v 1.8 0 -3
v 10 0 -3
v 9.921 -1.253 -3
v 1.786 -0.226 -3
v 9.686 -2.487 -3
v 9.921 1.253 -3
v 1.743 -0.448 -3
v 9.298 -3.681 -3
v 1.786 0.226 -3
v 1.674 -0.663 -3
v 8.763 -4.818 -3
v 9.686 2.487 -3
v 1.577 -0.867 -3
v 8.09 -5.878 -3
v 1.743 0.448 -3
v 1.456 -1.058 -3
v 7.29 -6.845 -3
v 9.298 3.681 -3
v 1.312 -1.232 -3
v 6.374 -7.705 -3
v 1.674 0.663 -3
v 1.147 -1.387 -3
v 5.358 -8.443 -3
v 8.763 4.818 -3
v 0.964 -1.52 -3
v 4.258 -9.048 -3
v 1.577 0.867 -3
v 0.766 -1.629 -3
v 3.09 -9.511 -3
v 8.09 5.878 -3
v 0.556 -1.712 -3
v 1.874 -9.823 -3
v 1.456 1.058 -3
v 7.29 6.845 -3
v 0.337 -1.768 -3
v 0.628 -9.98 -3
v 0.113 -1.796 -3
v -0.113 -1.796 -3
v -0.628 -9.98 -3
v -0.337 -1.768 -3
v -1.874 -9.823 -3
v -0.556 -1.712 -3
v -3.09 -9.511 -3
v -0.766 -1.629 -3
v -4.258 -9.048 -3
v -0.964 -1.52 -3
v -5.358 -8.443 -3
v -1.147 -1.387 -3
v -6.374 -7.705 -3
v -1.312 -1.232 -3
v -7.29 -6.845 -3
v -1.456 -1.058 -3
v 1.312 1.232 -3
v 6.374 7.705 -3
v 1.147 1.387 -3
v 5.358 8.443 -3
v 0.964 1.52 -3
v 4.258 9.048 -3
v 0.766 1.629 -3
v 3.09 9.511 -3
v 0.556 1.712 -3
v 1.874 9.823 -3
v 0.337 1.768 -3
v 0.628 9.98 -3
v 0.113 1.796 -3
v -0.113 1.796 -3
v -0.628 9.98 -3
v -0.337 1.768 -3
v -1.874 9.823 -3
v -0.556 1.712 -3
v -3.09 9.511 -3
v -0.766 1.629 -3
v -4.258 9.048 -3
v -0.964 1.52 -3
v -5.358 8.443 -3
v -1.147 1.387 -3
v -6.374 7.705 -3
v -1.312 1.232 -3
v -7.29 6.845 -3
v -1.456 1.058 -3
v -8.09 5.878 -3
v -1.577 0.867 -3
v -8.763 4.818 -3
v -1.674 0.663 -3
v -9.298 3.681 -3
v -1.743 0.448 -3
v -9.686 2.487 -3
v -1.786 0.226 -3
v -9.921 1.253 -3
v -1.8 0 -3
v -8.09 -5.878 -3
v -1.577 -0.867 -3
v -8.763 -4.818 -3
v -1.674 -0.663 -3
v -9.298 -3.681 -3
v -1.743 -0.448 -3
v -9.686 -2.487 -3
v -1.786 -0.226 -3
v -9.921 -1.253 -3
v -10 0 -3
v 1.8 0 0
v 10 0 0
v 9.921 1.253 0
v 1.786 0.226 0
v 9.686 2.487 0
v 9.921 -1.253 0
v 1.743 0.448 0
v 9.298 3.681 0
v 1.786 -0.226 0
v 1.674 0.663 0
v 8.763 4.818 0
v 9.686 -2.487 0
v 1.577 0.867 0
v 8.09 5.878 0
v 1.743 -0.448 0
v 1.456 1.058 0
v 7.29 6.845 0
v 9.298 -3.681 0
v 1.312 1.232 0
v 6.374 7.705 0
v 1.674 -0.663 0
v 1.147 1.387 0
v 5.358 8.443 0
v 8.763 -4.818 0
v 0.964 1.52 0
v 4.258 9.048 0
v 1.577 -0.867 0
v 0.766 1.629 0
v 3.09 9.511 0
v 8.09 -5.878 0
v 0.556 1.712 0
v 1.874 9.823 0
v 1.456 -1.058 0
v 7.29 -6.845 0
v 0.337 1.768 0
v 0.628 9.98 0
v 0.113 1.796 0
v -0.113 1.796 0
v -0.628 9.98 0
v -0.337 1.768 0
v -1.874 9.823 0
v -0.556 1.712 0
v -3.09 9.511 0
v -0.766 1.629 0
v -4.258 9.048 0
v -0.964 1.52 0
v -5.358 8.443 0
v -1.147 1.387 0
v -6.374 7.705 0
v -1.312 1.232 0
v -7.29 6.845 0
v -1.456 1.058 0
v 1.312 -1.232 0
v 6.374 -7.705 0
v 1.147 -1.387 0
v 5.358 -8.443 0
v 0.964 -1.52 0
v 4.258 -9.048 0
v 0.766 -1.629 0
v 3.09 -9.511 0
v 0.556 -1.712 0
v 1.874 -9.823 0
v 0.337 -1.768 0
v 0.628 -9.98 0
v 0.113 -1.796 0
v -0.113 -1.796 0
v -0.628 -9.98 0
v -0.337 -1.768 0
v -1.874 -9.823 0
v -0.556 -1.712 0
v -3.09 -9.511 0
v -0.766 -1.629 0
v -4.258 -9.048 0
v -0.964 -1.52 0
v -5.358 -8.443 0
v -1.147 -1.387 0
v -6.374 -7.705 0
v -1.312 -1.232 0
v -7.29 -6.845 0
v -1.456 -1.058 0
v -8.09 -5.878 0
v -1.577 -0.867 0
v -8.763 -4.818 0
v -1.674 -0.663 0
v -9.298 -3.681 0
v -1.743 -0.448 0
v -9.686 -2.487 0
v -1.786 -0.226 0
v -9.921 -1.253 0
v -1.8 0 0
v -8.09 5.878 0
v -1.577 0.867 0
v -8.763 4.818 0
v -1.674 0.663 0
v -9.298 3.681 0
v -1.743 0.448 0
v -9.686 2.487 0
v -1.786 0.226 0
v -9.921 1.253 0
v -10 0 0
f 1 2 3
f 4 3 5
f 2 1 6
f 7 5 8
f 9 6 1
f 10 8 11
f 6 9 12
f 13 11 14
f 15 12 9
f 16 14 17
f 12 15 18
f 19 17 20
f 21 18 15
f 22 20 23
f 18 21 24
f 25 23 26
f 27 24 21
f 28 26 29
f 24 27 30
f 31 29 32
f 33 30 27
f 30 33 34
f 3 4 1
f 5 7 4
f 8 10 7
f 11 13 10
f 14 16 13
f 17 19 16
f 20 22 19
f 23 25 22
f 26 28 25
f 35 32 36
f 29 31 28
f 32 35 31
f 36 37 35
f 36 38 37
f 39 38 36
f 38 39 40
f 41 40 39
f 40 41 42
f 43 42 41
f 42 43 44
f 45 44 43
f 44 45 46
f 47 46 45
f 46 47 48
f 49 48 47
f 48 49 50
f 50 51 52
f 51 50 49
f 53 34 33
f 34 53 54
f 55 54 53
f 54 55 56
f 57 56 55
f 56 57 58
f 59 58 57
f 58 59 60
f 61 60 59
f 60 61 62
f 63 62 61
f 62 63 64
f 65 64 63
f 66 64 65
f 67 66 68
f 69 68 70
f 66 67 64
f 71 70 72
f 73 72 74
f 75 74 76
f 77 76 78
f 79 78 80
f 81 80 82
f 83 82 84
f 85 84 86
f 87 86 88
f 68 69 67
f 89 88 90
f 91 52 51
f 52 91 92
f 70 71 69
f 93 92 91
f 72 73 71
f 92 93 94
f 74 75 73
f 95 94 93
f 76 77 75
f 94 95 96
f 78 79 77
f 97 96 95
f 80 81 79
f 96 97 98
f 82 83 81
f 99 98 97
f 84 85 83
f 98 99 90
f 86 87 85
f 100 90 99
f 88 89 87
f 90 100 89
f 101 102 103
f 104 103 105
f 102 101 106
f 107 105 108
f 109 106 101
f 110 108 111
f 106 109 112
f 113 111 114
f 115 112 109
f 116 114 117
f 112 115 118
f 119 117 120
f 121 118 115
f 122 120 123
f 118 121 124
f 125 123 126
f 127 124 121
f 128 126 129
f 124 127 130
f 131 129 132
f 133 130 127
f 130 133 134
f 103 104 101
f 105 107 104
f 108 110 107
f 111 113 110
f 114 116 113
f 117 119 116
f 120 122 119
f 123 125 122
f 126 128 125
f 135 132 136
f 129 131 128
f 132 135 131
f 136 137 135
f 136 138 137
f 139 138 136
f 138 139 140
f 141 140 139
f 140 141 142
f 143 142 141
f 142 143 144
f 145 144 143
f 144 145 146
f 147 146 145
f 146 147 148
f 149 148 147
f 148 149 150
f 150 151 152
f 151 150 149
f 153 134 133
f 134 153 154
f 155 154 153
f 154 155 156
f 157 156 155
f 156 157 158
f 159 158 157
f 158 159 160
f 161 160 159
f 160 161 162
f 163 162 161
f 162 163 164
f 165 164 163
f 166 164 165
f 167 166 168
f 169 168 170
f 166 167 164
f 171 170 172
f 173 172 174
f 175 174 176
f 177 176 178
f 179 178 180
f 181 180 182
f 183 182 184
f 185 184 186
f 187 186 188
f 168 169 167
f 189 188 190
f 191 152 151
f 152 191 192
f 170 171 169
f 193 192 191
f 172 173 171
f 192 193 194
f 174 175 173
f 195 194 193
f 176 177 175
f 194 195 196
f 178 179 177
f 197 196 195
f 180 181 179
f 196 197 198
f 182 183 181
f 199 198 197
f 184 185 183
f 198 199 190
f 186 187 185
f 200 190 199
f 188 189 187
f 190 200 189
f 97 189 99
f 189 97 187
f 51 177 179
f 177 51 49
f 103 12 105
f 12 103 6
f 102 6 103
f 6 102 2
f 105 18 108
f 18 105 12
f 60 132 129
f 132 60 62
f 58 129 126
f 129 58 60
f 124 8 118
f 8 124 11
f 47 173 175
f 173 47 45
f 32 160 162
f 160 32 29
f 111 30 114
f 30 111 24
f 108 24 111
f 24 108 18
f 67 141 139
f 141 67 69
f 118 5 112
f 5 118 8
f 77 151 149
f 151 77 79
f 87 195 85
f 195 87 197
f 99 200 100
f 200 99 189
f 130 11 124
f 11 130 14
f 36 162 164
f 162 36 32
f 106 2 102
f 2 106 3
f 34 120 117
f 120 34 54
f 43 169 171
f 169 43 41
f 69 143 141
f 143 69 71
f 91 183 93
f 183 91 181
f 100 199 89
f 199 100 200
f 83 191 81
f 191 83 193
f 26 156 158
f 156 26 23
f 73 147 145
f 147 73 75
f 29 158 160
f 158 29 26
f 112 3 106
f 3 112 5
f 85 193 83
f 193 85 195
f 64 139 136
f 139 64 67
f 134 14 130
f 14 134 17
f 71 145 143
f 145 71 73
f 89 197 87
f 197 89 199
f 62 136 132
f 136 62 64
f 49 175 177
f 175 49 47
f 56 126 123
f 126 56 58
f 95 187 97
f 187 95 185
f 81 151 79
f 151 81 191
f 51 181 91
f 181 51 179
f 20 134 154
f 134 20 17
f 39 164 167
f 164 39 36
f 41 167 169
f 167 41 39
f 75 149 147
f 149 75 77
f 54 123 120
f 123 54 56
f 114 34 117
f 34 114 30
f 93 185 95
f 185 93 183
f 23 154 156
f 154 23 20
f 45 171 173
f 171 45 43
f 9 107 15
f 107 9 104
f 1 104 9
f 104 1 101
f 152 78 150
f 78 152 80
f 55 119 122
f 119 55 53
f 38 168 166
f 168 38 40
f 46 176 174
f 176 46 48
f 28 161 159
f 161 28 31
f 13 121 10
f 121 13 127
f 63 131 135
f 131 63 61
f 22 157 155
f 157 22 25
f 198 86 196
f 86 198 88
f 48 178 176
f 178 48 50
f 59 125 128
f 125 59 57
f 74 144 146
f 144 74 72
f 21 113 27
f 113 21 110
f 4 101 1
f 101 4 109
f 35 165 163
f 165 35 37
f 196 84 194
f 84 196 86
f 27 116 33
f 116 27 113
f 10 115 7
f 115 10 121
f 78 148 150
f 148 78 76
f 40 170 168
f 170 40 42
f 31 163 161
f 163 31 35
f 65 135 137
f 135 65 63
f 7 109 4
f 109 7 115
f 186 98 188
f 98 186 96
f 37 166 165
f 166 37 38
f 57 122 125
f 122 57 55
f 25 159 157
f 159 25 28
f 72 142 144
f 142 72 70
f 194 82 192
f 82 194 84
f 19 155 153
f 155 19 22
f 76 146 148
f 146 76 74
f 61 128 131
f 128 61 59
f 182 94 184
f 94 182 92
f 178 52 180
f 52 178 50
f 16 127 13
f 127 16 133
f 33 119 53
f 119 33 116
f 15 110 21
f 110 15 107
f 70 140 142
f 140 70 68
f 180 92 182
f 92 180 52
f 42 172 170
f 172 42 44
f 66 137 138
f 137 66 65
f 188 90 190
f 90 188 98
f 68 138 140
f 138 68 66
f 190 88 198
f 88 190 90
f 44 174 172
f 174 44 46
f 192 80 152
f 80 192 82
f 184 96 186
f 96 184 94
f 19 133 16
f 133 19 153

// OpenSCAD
$fn = 50;


difference() {
	union() {
		translate(v = [0, 0, -3.0000000000]) {
			cylinder(h = 3, r = 7.0000000000);
		}
		translate(v = [0, 0, -3.0000000000]) {
			cylinder(h = 3, r = 10.0000000000);
		}
	}
	union() {
		#translate(v = [0, 0, -3]) {
			cylinder(h = 3, r = 1.8000000000);
		}
	}
}
